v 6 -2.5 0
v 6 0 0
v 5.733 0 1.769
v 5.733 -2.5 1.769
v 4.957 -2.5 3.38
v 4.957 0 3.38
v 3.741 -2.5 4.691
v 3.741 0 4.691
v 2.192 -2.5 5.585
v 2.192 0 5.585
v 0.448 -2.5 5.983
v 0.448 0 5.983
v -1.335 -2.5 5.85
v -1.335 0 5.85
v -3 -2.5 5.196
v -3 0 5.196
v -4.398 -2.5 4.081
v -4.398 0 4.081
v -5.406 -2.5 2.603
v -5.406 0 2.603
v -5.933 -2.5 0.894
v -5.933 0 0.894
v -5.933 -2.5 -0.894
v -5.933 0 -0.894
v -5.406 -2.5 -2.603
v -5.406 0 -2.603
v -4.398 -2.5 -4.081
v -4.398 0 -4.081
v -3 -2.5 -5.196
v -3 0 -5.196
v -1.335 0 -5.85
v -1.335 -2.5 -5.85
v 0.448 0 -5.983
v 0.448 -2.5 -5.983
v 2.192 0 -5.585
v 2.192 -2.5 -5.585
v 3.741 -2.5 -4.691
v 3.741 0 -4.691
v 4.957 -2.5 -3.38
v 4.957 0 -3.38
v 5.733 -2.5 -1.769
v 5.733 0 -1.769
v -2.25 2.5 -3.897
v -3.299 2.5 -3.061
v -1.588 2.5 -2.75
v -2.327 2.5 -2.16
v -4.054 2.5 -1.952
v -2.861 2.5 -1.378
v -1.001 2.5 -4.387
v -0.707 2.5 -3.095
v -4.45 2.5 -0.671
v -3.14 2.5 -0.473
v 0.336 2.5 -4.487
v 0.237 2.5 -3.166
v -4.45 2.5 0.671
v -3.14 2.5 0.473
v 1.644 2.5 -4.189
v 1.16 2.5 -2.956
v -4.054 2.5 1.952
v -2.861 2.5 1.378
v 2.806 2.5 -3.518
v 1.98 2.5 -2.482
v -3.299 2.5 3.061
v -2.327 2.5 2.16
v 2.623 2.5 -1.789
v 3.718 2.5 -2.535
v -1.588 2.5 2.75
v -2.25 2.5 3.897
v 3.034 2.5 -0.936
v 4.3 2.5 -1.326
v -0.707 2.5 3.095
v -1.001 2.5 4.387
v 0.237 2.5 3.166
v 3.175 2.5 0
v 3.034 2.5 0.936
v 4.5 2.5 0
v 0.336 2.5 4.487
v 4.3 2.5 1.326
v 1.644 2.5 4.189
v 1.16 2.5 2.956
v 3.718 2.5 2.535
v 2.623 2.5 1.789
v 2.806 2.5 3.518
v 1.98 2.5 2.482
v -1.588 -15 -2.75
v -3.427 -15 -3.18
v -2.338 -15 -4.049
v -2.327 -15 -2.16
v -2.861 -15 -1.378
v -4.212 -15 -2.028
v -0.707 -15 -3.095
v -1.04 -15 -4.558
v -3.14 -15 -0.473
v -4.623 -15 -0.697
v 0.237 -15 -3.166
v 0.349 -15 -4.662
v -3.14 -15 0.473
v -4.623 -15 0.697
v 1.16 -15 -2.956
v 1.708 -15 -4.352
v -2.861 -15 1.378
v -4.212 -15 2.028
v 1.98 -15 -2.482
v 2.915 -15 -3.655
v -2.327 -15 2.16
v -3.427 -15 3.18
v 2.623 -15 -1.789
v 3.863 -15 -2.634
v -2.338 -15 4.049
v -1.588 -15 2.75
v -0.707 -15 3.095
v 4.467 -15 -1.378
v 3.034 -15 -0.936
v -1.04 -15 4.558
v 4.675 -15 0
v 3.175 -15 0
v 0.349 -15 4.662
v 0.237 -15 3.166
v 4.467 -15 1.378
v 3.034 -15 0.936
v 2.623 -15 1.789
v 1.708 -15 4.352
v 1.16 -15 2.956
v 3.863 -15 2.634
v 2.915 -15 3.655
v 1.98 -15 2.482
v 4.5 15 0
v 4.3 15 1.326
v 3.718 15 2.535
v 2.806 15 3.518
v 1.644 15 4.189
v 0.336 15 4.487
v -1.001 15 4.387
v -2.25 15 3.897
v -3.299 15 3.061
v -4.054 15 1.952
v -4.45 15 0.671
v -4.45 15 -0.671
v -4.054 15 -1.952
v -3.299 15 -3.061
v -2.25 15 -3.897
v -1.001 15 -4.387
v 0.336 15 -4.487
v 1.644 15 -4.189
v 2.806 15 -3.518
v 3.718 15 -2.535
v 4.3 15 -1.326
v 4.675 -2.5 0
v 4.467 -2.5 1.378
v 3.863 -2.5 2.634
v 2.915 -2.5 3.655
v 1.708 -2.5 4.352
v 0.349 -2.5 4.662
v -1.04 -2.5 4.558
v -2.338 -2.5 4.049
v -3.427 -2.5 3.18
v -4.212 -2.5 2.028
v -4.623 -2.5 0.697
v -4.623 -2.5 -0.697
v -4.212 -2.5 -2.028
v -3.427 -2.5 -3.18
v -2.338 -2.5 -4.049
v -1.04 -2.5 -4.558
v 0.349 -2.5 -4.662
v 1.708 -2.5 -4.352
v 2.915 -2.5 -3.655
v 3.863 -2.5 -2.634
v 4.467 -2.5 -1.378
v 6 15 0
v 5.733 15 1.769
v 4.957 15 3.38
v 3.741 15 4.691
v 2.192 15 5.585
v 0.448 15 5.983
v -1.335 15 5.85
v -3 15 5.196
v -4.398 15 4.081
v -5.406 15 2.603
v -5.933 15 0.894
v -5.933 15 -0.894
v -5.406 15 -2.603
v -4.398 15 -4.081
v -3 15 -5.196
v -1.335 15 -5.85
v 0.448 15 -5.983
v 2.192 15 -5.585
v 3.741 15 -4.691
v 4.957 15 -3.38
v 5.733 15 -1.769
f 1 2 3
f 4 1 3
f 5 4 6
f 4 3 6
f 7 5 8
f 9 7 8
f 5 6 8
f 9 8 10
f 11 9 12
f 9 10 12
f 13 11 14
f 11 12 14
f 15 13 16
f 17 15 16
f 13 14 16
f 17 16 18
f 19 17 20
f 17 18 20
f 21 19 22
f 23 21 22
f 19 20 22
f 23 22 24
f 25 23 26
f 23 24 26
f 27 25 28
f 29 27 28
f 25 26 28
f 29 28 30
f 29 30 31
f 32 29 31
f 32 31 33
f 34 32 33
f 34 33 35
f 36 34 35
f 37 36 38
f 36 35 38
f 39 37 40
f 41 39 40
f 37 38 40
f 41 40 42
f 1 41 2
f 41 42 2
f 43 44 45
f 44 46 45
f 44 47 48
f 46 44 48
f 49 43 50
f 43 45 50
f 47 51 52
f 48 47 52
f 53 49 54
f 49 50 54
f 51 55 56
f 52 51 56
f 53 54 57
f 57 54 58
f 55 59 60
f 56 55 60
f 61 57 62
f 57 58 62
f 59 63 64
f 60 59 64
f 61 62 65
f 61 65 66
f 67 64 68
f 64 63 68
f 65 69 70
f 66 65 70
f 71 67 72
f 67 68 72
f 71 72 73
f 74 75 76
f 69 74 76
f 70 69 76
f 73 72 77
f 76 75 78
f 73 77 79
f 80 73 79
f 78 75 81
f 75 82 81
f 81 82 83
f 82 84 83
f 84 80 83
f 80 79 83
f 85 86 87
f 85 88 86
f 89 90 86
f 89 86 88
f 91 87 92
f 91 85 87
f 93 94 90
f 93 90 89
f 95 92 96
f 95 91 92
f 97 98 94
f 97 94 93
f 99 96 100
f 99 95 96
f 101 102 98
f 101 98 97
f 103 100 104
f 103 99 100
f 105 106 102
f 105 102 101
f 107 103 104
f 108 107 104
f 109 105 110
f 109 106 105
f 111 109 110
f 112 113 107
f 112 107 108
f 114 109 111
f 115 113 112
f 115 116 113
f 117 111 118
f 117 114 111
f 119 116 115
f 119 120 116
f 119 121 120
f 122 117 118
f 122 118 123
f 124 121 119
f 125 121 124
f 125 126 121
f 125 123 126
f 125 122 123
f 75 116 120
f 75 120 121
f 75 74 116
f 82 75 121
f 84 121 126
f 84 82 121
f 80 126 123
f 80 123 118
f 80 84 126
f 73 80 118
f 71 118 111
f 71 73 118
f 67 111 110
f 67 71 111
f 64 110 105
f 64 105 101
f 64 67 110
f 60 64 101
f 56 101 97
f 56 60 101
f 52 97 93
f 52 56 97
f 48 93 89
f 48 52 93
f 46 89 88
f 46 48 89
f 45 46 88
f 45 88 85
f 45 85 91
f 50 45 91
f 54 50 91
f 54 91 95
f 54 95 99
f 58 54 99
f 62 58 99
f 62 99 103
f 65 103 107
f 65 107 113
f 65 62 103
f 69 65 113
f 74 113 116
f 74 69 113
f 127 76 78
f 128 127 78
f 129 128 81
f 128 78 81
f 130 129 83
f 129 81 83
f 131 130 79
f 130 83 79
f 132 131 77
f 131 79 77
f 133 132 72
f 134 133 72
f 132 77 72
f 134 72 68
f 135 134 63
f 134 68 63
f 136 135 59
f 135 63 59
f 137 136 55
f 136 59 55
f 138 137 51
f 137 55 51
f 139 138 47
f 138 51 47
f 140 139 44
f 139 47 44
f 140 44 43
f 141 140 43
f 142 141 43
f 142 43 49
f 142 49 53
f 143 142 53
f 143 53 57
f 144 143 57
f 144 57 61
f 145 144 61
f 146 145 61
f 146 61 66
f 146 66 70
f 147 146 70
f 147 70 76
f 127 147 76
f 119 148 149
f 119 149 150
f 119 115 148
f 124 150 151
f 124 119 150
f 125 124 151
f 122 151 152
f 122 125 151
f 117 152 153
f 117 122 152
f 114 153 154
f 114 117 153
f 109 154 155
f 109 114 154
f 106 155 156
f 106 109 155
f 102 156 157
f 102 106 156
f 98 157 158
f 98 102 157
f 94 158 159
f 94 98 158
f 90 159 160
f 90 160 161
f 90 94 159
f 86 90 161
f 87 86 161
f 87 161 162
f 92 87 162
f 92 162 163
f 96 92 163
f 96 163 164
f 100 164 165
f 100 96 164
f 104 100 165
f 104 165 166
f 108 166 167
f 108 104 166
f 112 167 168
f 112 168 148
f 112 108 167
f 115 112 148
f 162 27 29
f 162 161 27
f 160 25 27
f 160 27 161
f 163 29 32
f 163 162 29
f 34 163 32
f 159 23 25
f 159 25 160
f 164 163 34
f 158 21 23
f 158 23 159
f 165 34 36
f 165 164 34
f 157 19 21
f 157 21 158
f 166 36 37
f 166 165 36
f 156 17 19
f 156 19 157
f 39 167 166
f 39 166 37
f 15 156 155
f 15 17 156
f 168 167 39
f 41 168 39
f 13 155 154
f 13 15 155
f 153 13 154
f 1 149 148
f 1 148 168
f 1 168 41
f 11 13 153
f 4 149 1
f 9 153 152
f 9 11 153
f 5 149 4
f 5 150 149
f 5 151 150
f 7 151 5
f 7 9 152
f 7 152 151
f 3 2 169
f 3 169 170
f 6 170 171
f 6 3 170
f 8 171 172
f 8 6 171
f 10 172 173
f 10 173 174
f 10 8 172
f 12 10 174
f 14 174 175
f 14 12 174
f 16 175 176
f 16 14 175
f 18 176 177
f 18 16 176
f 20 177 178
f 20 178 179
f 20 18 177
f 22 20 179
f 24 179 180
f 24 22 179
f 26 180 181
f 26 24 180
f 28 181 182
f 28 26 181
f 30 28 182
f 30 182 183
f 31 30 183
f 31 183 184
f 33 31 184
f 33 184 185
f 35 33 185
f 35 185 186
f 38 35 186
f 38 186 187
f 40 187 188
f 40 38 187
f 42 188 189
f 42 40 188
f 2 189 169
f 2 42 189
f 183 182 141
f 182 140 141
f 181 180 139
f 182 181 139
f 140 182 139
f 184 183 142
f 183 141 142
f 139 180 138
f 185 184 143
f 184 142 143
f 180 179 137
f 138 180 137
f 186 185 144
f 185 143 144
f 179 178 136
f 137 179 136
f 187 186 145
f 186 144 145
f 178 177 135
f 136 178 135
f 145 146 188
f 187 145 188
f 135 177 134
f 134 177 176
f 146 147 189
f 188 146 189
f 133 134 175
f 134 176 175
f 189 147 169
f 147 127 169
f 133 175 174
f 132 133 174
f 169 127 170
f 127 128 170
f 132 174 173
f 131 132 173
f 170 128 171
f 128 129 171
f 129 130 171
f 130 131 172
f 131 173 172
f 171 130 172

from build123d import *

# Parameters (mm, degrees)
F0_R          = 4.675
F0_R_2        = 3.175
F1_DEPTH      = 15
F1_DEPTH_BACK = 2.5
F2_R          = 6
F2_R_2        = 4.5
F3_DEPTH      = 15
F3_DEPTH_BACK = 2.5


with BuildPart() as f1:
    # F0 (on Front) → F1 (new body, two sides)
    with BuildSketch(Plane.XZ) as f1_sk:
        Circle(F0_R)
        Circle(F0_R_2, mode=Mode.SUBTRACT)
    extrude(amount=F1_DEPTH)
    extrude(f1_sk.sketch, amount=-F1_DEPTH_BACK)

    # F2 (on Front) → F3 (join, two sides)
    with BuildSketch(Plane.XZ) as f3_sk:
        Circle(F2_R)
        Circle(F2_R_2, mode=Mode.SUBTRACT)
    extrude(amount=-F3_DEPTH)
    extrude(f3_sk.sketch, amount=F3_DEPTH_BACK)


solid = f1.part
